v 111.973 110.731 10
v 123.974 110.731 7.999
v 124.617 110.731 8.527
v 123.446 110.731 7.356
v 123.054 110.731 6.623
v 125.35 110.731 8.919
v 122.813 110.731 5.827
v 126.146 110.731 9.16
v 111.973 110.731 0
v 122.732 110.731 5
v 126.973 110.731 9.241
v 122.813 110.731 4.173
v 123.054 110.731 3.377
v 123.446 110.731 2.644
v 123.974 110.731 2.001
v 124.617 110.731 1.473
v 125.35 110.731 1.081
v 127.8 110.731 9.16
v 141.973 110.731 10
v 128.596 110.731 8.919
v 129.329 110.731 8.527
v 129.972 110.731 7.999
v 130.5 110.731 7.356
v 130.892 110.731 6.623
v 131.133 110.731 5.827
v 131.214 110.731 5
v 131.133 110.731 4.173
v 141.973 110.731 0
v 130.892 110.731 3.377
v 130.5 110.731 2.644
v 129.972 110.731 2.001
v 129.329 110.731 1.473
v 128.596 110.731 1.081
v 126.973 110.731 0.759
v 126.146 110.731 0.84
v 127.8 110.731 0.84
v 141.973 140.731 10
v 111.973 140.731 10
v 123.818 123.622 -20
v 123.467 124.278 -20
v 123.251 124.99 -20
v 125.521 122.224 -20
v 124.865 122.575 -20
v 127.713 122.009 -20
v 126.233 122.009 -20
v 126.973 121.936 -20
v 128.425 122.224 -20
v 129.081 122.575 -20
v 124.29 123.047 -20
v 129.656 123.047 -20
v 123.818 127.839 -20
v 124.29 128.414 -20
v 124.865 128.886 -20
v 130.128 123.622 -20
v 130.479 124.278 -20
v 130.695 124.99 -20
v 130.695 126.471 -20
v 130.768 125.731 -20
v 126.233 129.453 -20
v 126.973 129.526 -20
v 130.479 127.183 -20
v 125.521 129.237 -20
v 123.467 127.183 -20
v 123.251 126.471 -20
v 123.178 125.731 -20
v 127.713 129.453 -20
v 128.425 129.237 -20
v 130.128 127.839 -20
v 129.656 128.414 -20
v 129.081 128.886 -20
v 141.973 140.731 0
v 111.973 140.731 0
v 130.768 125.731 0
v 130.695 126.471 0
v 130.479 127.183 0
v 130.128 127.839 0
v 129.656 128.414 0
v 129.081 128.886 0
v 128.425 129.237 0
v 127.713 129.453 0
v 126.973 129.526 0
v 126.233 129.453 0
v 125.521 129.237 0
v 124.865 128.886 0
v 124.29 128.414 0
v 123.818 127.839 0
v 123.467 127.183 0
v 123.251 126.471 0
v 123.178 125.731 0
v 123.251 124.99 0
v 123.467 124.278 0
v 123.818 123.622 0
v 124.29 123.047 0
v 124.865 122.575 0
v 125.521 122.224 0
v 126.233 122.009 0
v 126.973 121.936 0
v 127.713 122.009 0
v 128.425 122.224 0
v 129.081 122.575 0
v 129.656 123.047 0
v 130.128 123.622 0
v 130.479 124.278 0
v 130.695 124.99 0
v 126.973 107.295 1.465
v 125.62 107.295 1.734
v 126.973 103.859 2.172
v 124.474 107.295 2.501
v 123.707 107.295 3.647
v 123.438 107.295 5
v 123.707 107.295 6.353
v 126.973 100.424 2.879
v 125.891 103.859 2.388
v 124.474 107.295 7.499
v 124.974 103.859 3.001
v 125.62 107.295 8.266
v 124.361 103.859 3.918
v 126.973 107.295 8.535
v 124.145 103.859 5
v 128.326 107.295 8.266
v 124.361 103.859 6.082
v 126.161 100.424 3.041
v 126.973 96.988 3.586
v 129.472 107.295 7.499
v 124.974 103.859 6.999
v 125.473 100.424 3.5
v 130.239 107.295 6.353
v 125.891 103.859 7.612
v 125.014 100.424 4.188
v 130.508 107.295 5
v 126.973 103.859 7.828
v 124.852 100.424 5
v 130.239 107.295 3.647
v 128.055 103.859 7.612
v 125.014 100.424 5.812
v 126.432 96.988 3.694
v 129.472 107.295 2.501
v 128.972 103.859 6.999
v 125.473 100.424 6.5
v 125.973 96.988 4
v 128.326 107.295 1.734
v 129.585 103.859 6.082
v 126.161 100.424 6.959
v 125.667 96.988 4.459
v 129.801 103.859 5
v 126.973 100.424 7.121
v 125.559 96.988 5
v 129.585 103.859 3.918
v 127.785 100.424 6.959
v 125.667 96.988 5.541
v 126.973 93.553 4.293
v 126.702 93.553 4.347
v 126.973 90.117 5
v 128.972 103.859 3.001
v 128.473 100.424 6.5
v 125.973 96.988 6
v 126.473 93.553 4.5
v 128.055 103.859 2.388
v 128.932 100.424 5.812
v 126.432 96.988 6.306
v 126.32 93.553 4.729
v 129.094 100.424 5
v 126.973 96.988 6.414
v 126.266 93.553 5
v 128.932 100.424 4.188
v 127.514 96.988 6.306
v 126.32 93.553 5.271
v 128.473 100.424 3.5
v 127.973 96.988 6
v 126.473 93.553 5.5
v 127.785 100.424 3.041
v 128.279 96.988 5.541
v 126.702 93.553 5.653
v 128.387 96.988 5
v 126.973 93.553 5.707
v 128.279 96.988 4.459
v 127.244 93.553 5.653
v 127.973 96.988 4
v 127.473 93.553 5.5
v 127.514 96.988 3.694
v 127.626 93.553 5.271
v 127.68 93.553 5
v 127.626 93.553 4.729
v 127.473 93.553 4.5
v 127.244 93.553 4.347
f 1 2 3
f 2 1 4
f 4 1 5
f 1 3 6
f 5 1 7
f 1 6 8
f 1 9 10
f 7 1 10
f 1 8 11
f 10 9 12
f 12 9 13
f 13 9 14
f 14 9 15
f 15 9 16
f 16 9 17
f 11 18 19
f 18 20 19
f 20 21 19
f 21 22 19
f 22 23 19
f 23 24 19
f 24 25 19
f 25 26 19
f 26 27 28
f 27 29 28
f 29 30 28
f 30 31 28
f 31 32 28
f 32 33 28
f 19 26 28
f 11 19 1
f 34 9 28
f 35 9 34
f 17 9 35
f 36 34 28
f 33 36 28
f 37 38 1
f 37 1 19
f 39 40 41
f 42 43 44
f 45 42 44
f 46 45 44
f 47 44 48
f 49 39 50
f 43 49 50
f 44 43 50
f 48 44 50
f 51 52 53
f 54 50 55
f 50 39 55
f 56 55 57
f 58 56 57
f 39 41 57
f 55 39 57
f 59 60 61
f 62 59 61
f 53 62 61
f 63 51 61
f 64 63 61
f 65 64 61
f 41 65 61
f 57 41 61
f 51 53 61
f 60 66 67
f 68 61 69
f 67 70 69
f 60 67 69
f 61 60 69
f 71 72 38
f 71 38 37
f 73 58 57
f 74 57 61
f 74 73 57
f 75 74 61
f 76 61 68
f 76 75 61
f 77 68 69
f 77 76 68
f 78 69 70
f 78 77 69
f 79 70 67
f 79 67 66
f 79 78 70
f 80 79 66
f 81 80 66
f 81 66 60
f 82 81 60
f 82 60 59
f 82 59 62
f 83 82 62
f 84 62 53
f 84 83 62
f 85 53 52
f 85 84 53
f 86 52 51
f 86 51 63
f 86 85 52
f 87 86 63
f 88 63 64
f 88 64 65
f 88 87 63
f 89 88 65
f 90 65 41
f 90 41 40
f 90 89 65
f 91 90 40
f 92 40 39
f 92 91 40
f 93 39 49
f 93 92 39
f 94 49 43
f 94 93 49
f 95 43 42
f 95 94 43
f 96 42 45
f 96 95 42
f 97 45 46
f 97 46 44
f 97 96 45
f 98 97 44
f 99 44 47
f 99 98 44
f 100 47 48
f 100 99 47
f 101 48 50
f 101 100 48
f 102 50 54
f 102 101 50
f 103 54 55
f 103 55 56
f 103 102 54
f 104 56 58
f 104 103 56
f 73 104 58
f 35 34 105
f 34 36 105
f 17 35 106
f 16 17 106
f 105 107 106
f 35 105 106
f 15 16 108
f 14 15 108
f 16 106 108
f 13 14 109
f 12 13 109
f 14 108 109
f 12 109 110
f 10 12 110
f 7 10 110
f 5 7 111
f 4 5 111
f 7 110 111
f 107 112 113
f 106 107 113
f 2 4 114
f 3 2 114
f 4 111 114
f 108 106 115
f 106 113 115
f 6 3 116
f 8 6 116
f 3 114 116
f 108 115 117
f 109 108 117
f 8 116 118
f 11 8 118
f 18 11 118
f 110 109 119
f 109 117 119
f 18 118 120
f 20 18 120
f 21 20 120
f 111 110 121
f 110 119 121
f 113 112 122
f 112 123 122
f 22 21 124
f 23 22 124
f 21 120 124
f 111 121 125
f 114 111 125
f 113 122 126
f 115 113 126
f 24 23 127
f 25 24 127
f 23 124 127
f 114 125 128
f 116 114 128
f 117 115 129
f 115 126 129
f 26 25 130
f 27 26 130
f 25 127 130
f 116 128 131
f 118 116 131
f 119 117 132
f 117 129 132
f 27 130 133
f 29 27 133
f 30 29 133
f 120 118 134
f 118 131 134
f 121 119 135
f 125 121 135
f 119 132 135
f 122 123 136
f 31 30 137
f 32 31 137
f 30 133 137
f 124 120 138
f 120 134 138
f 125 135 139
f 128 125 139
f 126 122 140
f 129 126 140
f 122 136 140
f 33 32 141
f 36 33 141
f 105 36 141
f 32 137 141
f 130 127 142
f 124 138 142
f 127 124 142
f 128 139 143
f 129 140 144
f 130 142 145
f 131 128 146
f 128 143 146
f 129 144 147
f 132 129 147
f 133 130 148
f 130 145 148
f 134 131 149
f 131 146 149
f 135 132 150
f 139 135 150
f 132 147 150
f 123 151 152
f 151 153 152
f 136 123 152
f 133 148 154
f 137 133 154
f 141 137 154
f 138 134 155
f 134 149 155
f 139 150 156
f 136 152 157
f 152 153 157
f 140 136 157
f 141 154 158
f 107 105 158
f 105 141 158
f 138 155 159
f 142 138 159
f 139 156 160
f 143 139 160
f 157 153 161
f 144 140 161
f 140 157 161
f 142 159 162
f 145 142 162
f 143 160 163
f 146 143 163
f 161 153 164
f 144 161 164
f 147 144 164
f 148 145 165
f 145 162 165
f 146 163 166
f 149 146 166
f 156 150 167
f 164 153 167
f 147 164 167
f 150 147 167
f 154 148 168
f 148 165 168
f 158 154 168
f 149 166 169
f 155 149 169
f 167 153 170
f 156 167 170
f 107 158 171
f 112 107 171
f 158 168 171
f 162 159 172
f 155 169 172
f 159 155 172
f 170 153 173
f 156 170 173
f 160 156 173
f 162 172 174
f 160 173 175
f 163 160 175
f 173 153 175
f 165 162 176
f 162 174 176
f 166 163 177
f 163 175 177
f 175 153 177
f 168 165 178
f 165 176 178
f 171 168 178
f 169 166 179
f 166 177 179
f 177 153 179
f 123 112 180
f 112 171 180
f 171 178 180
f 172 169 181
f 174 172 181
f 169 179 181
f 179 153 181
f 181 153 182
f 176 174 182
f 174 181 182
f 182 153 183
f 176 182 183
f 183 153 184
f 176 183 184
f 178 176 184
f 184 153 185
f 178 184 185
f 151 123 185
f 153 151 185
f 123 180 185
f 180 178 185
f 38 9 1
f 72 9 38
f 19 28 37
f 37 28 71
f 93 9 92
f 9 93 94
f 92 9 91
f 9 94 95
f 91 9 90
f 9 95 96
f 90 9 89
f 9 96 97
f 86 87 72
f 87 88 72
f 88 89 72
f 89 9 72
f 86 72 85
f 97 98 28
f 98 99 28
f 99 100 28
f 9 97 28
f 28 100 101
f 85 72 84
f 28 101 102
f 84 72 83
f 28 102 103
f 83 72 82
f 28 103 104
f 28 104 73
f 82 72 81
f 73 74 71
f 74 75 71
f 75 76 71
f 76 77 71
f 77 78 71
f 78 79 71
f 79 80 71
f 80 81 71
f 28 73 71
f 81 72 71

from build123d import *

# Parameters (mm, degrees)
SKETCH1_R           = 3.795
BOSS_EXTRUDE1_DEPTH = 20
SKETCH2_W           = 30
SKETCH2_H           = 30
BOSS_EXTRUDE2_DEPTH = 10


with BuildPart() as part:
    # Sketch1 → Boss-Extrude1 (new body)
    with BuildSketch(Plane.XY):
        with Locations((126.972995011, 125.730606971)):
            Circle(SKETCH1_R)
    extrude(amount=-BOSS_EXTRUDE1_DEPTH)

    # Sketch2 → Boss-Extrude2 (add)
    with BuildSketch(Plane.XY):
        with Locations((126.972995011, 125.730606971)):
            Rectangle(SKETCH2_W, SKETCH2_H)
    extrude(amount=BOSS_EXTRUDE2_DEPTH)

    # Sketch3 → Revolve1 (revolve)
    with BuildSketch(Plane(origin=(126.972995011, 0, 0), x_dir=(0, 0, -1), z_dir=(1, 0, 0))):
        Polygon((-0.758524561, 110.730606971), (-5, 90.117115807), (-5, 110.730606971), align=None)
    revolve(axis=Axis((126.972995011, 90.117115807, 5), (0, 1, 0)))


solid = part.part
